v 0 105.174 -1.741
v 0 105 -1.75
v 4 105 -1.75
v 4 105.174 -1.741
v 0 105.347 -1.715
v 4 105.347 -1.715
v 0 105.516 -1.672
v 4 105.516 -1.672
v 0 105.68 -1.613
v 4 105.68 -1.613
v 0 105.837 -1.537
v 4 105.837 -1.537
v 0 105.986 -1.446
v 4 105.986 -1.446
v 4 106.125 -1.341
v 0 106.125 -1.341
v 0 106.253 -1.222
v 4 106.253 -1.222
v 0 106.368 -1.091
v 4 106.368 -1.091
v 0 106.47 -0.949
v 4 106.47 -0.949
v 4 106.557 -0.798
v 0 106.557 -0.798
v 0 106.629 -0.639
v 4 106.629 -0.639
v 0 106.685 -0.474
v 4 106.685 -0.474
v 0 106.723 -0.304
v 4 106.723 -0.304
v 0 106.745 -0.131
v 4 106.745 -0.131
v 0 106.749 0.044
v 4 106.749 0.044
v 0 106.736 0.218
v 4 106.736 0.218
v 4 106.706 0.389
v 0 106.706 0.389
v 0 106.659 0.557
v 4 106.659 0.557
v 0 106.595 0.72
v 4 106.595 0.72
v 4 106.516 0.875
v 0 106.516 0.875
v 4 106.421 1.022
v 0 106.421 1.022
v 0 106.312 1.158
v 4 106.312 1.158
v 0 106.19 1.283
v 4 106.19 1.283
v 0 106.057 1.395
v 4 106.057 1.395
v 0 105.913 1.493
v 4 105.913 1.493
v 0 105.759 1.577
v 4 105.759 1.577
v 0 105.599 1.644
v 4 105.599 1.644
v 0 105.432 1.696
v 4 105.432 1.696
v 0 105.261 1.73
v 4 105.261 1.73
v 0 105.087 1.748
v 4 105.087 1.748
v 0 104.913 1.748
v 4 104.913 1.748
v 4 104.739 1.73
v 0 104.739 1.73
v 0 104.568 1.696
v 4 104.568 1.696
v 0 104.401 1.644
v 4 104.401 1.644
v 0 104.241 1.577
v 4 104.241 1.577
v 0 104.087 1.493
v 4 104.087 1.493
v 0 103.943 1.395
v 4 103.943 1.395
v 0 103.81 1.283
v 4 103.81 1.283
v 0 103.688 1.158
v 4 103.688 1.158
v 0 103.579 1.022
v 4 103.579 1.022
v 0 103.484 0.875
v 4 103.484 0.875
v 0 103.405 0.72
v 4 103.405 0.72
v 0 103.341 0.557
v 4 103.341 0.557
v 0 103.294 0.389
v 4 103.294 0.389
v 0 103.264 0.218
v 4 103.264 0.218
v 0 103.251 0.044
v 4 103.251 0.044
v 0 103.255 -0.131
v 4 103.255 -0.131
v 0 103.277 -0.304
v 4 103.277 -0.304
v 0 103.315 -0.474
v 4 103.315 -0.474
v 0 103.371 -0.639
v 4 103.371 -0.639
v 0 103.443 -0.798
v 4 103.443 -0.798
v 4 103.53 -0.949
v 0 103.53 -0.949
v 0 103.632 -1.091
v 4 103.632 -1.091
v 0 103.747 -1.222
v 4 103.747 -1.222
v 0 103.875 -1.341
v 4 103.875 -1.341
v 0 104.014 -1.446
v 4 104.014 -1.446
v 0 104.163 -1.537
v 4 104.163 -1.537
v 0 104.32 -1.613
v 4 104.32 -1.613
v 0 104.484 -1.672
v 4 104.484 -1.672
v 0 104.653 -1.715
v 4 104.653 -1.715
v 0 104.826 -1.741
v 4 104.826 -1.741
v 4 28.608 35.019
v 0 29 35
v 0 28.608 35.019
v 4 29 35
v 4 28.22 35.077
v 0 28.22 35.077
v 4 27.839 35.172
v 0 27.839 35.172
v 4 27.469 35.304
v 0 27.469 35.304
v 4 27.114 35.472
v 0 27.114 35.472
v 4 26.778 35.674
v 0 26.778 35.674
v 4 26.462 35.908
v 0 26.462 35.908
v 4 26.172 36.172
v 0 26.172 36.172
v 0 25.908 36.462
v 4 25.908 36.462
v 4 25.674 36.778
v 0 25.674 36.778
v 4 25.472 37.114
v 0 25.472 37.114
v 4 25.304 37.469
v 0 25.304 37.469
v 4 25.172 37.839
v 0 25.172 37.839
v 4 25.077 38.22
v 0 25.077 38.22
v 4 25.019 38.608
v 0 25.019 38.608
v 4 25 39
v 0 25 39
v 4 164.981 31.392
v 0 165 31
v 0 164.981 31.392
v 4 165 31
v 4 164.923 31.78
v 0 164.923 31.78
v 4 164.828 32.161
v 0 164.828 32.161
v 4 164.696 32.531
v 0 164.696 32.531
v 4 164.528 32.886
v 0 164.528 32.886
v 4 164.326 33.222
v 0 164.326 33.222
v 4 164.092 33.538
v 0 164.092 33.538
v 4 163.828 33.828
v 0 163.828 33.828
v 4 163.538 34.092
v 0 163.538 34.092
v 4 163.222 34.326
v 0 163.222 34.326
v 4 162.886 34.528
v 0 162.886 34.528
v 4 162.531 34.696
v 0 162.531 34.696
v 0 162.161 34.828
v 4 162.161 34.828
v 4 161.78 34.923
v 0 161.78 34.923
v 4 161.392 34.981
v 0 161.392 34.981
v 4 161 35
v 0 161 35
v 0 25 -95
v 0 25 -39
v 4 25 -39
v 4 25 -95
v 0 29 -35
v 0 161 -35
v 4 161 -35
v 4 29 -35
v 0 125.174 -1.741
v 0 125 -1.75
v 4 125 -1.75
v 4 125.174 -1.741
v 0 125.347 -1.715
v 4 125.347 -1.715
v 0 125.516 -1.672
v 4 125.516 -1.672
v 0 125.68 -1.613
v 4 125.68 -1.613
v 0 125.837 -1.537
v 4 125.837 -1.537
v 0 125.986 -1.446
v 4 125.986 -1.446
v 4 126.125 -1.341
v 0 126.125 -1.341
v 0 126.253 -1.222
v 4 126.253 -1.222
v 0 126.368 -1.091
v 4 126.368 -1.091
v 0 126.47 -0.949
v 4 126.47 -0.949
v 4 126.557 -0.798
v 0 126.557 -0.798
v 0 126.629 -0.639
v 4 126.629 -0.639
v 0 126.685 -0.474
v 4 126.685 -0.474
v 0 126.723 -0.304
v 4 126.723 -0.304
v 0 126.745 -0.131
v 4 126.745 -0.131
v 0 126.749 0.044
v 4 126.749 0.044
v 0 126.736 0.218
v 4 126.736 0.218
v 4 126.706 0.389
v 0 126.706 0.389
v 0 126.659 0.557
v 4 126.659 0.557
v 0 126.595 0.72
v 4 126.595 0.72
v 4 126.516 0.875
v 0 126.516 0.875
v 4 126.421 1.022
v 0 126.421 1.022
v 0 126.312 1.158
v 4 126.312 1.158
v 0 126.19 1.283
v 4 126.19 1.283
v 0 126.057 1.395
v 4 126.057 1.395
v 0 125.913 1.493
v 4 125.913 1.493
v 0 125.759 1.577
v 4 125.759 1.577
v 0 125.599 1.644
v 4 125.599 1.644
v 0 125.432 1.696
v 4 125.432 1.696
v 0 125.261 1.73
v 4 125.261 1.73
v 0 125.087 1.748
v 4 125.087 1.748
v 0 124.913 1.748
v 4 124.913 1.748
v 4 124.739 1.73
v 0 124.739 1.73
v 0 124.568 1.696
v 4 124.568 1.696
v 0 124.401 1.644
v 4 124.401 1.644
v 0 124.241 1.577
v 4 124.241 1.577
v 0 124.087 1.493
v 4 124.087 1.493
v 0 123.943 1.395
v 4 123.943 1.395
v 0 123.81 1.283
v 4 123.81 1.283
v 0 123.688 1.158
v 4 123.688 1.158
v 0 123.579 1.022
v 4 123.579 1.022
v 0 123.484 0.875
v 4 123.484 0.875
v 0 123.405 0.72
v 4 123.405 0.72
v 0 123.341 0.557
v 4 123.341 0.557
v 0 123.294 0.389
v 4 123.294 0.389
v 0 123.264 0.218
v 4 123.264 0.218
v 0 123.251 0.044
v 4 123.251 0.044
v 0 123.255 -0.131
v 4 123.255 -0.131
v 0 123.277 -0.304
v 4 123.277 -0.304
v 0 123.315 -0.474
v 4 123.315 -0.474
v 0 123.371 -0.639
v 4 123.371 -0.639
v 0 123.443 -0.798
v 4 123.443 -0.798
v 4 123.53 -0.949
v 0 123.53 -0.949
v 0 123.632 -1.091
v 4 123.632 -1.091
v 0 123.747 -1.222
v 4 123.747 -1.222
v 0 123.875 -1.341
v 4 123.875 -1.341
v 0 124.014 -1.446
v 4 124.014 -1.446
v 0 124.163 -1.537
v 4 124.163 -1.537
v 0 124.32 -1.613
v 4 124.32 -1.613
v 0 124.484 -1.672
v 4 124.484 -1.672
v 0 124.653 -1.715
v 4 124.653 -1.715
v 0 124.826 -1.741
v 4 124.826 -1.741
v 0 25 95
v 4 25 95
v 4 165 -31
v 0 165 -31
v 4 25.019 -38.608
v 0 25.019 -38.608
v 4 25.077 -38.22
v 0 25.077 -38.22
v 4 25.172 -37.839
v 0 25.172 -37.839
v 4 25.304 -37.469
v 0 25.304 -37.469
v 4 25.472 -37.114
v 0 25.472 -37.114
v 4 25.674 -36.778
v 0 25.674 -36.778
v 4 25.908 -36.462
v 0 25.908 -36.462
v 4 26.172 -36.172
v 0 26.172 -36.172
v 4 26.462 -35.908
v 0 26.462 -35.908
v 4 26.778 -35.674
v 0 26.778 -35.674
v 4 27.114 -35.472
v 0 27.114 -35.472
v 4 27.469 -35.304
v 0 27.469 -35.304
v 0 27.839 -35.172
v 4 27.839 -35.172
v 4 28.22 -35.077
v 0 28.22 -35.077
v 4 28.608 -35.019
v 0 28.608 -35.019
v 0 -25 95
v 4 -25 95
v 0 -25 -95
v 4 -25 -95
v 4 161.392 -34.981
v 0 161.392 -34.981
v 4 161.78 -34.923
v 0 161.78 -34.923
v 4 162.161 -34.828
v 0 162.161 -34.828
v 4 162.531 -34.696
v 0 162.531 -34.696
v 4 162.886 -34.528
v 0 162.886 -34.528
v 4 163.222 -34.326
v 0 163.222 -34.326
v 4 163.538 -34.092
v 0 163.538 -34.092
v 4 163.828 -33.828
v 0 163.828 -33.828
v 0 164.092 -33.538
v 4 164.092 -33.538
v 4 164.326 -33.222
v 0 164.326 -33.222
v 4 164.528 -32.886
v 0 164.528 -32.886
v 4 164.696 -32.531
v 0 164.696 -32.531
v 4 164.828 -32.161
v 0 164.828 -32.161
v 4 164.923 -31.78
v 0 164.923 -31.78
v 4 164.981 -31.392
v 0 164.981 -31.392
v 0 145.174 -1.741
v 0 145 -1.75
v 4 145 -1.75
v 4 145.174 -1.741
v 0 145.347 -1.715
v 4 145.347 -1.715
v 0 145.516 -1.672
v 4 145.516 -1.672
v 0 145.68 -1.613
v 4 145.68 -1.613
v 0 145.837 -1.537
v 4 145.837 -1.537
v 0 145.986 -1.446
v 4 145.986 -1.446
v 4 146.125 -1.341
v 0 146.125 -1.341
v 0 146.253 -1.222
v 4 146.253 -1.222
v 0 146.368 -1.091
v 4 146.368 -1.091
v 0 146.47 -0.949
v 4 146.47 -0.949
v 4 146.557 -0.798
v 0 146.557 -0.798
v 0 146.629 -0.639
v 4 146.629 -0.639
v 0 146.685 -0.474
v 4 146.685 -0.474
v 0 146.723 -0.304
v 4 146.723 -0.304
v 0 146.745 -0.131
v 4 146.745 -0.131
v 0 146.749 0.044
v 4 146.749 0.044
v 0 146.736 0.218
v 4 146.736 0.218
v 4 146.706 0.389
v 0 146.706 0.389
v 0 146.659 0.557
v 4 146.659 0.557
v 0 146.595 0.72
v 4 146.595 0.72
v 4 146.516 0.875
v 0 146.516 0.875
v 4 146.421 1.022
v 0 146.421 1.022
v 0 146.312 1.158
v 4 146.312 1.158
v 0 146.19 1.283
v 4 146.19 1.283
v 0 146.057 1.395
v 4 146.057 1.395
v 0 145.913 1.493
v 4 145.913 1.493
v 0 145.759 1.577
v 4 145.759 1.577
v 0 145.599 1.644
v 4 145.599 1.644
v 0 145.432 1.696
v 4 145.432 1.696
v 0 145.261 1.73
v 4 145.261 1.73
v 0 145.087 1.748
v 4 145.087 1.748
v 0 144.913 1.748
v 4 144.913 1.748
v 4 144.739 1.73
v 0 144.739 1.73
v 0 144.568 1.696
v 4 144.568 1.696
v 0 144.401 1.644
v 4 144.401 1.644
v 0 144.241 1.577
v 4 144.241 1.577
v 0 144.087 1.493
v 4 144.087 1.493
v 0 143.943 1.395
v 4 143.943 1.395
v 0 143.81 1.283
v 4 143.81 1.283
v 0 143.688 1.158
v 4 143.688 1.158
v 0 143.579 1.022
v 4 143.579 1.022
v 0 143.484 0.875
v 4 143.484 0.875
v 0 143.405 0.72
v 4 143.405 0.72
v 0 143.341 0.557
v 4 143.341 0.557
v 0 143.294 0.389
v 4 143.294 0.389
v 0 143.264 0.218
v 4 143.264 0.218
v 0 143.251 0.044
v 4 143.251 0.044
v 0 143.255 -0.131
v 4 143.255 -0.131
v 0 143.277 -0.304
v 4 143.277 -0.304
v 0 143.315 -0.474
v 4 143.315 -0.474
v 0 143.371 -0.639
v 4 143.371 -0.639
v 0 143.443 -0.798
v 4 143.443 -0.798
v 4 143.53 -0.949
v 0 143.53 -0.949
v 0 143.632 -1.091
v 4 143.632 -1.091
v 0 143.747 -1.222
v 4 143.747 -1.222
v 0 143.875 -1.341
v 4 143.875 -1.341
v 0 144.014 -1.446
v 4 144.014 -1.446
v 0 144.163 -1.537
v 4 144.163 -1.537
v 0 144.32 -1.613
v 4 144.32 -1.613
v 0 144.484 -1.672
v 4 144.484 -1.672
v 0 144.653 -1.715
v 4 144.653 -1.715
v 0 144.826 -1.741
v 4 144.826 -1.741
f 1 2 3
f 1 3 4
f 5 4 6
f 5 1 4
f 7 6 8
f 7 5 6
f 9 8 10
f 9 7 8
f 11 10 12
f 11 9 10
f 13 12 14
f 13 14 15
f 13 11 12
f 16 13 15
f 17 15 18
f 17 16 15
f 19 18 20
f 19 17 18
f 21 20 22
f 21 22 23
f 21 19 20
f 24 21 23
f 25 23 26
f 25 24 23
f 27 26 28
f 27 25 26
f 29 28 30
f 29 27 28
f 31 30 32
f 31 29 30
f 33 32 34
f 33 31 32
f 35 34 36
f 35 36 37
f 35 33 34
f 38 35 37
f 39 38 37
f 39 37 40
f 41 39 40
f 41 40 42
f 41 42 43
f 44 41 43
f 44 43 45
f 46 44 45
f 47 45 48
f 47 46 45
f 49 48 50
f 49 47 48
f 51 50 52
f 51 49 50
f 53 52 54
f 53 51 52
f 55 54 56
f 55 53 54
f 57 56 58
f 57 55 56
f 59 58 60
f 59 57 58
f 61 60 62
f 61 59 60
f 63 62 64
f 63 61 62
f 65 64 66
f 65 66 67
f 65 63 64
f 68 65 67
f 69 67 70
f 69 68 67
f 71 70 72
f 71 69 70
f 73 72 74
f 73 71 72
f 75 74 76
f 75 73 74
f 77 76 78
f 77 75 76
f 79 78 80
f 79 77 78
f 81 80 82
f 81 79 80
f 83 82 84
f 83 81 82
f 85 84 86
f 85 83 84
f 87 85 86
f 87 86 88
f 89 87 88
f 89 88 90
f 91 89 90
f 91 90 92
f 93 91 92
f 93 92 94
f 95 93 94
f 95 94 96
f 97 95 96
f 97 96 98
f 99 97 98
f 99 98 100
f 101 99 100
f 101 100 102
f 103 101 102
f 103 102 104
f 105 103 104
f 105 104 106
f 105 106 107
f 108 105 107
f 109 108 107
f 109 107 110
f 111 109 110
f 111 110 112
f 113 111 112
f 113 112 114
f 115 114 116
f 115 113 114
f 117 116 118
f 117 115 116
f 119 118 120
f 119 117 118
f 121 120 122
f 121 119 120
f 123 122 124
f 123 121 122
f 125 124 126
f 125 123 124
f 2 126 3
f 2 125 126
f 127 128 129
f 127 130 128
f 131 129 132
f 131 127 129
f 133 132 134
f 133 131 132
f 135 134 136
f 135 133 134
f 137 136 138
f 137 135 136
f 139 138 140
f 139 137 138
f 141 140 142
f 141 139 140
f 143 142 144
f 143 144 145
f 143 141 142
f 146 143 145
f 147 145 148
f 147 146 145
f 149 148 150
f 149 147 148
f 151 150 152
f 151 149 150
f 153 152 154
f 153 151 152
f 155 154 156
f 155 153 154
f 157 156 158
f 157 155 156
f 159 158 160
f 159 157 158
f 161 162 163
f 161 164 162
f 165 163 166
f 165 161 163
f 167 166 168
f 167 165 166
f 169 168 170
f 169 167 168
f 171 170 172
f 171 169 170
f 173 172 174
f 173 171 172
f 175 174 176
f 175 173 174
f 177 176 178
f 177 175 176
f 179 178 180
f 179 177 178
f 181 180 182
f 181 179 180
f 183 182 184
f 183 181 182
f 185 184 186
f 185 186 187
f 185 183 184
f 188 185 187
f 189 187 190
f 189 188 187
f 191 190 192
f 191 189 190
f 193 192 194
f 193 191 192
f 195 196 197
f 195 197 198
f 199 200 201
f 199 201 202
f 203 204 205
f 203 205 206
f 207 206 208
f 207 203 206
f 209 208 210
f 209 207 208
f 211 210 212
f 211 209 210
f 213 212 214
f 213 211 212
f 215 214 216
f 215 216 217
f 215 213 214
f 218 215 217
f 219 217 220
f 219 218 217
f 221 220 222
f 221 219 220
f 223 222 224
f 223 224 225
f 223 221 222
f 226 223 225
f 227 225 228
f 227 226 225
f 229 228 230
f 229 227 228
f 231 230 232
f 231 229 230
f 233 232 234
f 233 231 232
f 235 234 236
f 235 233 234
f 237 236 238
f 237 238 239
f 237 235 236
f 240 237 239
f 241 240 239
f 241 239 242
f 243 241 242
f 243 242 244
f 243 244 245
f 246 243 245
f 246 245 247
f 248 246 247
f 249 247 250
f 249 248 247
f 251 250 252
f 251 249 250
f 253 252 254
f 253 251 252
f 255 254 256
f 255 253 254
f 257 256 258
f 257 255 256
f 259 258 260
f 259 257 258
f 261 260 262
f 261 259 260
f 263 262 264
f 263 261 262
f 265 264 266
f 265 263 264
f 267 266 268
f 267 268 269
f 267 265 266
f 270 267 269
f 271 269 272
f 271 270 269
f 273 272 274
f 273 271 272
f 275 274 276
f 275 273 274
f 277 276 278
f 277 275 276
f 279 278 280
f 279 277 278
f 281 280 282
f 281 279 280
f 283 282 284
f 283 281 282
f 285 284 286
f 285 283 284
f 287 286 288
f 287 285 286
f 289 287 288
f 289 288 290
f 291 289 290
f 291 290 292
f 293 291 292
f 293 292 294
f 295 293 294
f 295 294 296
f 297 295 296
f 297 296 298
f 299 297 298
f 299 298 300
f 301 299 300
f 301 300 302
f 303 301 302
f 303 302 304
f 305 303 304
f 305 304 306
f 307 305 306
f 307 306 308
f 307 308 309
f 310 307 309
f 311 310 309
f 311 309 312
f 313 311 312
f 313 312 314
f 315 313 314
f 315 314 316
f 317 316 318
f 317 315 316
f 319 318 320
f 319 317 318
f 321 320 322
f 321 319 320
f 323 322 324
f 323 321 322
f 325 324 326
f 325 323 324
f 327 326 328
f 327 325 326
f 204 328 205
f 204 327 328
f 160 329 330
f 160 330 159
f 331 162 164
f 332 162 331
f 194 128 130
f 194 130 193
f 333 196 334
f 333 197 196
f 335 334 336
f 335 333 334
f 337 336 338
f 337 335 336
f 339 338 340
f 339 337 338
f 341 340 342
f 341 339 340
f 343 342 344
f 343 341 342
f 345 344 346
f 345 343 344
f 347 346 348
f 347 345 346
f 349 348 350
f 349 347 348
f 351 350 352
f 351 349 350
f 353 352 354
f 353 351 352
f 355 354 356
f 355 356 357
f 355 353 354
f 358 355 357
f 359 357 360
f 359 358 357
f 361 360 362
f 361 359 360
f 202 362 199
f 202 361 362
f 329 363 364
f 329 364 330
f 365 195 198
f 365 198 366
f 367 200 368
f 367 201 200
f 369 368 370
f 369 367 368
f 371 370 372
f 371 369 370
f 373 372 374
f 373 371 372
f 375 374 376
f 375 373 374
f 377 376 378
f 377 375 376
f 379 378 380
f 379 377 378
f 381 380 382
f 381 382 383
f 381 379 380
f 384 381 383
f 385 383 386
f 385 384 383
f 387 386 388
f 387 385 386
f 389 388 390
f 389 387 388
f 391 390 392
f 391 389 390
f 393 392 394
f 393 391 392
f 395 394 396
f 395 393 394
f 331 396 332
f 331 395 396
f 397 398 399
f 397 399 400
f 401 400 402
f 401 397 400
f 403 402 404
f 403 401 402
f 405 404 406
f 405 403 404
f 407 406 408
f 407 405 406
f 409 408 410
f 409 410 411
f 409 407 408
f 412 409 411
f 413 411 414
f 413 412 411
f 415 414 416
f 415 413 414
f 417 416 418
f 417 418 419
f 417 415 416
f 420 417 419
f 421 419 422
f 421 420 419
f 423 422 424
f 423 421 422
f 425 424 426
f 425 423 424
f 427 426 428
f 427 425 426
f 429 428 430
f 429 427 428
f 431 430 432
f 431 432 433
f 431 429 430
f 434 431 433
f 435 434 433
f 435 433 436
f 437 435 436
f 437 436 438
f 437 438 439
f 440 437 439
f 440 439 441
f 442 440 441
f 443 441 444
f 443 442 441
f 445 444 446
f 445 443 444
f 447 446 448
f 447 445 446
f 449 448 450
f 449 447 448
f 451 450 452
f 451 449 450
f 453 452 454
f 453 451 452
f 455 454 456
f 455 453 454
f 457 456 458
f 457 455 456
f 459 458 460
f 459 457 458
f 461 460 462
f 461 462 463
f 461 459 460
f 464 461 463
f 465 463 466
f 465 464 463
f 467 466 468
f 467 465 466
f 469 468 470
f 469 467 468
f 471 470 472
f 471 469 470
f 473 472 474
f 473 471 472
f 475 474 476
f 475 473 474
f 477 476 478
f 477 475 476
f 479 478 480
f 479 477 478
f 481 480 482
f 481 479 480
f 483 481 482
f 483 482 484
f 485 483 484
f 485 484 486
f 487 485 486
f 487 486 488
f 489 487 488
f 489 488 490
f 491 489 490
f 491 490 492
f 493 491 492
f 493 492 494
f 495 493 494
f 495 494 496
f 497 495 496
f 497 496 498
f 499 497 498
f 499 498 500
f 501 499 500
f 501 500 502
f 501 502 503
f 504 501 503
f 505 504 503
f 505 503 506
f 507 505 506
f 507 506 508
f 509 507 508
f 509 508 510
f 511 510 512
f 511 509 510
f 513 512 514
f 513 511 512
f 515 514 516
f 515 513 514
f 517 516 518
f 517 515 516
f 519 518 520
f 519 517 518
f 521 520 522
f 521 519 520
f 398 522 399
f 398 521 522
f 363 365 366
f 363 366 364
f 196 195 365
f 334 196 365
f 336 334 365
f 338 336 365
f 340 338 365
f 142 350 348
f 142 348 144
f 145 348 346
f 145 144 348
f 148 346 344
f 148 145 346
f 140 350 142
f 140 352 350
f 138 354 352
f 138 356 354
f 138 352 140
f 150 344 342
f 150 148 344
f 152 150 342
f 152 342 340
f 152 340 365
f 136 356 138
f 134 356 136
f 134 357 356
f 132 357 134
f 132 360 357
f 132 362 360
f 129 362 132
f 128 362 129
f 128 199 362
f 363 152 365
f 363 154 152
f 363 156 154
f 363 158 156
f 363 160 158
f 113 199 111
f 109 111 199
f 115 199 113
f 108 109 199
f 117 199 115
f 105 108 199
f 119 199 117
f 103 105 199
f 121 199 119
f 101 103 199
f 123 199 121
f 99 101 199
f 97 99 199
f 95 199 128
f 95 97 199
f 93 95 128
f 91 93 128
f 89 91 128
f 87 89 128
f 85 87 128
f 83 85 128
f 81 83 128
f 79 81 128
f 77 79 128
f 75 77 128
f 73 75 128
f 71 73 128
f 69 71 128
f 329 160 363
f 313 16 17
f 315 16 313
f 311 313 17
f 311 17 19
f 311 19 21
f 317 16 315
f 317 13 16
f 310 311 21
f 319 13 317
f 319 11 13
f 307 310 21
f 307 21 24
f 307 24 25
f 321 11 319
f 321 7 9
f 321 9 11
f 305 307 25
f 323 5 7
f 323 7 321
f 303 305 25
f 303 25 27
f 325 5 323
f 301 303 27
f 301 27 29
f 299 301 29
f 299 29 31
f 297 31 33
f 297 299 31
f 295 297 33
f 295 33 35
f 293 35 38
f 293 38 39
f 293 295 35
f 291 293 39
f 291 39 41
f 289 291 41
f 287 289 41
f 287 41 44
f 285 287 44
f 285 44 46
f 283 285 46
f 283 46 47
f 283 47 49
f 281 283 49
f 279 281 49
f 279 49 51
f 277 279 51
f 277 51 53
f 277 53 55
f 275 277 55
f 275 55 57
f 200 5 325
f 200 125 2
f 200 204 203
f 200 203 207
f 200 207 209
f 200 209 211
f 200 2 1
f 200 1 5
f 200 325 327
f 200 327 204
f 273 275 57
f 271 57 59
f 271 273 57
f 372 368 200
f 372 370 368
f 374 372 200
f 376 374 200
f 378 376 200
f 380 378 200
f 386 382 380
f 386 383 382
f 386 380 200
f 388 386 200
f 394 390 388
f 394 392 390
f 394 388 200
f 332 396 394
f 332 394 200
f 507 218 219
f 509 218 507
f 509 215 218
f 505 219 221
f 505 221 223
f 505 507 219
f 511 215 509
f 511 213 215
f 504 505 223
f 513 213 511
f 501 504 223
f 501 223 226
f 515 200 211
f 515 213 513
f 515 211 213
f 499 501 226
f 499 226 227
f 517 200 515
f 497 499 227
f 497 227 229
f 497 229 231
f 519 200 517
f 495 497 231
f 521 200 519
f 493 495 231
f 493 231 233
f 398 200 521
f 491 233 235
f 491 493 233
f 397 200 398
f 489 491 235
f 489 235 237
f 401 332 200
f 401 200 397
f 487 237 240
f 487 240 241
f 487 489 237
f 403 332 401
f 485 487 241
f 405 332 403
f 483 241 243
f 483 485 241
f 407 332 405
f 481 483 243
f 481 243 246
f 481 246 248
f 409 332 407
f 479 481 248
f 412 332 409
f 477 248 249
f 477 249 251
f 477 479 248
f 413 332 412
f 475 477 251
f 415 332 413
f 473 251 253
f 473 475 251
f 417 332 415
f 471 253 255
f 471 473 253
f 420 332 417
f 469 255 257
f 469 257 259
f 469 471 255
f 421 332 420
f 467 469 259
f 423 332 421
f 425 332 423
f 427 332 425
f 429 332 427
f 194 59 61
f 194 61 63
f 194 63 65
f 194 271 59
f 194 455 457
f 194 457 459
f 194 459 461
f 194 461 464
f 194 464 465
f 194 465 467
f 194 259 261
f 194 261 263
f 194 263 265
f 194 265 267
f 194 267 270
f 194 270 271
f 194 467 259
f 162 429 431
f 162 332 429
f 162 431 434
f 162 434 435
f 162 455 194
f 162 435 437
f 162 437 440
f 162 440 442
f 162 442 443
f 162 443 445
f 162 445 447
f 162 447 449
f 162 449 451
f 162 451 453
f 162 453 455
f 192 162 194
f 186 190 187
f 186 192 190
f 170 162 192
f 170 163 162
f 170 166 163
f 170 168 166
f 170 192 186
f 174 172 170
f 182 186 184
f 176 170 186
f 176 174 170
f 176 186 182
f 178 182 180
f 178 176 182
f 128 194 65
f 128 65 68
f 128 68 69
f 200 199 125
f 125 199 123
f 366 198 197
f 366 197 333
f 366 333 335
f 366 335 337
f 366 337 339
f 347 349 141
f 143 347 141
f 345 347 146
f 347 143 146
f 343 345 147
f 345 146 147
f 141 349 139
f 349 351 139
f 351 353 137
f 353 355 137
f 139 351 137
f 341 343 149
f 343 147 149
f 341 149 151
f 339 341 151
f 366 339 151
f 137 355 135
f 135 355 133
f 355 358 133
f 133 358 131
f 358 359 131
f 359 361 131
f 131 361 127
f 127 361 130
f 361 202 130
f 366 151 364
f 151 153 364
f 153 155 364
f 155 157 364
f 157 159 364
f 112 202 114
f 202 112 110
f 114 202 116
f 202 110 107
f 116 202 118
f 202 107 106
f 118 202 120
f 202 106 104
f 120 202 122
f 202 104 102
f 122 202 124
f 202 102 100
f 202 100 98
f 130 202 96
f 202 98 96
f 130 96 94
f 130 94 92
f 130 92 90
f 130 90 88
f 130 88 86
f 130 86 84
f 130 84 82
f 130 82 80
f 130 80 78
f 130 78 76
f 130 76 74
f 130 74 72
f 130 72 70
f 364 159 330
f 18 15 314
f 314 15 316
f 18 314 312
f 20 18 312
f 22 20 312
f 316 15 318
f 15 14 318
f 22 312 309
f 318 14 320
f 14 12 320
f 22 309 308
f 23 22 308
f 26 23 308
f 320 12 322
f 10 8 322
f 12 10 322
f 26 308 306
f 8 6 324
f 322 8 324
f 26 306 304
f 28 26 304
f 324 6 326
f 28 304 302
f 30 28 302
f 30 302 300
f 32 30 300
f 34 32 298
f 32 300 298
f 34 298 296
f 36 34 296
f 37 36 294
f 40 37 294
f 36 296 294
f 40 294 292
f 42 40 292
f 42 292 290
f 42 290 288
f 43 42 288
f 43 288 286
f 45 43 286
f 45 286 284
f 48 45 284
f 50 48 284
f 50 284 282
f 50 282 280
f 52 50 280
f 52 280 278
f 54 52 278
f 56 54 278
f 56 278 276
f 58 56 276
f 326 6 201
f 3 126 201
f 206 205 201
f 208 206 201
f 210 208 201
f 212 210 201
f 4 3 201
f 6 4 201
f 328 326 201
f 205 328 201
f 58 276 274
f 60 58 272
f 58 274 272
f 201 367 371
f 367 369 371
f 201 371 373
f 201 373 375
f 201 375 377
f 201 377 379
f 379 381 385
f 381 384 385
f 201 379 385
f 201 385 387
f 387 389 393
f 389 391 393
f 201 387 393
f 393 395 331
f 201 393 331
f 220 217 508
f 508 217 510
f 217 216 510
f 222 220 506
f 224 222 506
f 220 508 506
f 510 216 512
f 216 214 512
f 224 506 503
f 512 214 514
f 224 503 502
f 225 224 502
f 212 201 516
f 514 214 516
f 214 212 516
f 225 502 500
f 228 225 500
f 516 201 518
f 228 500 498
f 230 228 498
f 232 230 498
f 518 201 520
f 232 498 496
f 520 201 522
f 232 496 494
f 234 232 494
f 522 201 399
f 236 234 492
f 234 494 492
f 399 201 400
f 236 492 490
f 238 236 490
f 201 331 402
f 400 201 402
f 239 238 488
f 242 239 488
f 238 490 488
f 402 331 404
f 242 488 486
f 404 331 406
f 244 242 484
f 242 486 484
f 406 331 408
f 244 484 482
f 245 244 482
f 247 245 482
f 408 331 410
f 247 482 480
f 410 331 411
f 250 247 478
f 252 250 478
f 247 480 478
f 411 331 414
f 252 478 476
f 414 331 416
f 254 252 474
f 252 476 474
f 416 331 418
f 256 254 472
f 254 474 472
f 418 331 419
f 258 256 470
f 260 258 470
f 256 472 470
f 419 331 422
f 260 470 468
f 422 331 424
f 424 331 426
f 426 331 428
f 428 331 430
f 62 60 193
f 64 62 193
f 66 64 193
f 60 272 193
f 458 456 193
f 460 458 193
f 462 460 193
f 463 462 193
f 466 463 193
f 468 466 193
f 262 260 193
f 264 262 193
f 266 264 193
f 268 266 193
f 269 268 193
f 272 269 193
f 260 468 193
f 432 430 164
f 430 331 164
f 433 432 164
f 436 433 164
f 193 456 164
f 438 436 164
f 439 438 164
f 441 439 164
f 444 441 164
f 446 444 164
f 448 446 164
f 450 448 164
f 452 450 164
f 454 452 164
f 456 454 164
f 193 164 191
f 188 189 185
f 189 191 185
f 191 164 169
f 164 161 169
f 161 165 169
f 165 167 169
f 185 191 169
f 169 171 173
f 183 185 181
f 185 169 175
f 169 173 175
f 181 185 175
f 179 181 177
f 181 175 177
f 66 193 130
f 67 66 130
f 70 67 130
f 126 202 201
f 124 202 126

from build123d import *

# Parameters (mm, degrees)
SKETCH1_R           = 1.75
BOSS_EXTRUDE1_DEPTH = 4
FILLET1_R           = 4


with BuildPart() as part:
    # Sketch1 → Boss-Extrude1 (new body)
    with BuildSketch(Plane(origin=(0, 0, 0), x_dir=(0, 0, -1), z_dir=(1, 0, 0))):
        Polygon((35, 25), (95, 25), (95, -25), (-95, -25), (-95, 25), (-35, 25), (-35, 165), (35, 165), align=None)
        with Locations((0, 145)):
            Circle(SKETCH1_R, mode=Mode.SUBTRACT)
        with Locations((0, 125)):
            Circle(SKETCH1_R, mode=Mode.SUBTRACT)
        with Locations((0, 105)):
            Circle(SKETCH1_R, mode=Mode.SUBTRACT)
    extrude(amount=BOSS_EXTRUDE1_DEPTH)

    # Fillet1
    fillet1_edges = [part.edges().sort_by_distance(p)[0] for p in [
        (2, 25, 35),
        (2, 165, 35),
        (2, 165, -35),
        (2, 25, -35),
    ]]
    fillet(fillet1_edges, radius=FILLET1_R)


solid = part.part
